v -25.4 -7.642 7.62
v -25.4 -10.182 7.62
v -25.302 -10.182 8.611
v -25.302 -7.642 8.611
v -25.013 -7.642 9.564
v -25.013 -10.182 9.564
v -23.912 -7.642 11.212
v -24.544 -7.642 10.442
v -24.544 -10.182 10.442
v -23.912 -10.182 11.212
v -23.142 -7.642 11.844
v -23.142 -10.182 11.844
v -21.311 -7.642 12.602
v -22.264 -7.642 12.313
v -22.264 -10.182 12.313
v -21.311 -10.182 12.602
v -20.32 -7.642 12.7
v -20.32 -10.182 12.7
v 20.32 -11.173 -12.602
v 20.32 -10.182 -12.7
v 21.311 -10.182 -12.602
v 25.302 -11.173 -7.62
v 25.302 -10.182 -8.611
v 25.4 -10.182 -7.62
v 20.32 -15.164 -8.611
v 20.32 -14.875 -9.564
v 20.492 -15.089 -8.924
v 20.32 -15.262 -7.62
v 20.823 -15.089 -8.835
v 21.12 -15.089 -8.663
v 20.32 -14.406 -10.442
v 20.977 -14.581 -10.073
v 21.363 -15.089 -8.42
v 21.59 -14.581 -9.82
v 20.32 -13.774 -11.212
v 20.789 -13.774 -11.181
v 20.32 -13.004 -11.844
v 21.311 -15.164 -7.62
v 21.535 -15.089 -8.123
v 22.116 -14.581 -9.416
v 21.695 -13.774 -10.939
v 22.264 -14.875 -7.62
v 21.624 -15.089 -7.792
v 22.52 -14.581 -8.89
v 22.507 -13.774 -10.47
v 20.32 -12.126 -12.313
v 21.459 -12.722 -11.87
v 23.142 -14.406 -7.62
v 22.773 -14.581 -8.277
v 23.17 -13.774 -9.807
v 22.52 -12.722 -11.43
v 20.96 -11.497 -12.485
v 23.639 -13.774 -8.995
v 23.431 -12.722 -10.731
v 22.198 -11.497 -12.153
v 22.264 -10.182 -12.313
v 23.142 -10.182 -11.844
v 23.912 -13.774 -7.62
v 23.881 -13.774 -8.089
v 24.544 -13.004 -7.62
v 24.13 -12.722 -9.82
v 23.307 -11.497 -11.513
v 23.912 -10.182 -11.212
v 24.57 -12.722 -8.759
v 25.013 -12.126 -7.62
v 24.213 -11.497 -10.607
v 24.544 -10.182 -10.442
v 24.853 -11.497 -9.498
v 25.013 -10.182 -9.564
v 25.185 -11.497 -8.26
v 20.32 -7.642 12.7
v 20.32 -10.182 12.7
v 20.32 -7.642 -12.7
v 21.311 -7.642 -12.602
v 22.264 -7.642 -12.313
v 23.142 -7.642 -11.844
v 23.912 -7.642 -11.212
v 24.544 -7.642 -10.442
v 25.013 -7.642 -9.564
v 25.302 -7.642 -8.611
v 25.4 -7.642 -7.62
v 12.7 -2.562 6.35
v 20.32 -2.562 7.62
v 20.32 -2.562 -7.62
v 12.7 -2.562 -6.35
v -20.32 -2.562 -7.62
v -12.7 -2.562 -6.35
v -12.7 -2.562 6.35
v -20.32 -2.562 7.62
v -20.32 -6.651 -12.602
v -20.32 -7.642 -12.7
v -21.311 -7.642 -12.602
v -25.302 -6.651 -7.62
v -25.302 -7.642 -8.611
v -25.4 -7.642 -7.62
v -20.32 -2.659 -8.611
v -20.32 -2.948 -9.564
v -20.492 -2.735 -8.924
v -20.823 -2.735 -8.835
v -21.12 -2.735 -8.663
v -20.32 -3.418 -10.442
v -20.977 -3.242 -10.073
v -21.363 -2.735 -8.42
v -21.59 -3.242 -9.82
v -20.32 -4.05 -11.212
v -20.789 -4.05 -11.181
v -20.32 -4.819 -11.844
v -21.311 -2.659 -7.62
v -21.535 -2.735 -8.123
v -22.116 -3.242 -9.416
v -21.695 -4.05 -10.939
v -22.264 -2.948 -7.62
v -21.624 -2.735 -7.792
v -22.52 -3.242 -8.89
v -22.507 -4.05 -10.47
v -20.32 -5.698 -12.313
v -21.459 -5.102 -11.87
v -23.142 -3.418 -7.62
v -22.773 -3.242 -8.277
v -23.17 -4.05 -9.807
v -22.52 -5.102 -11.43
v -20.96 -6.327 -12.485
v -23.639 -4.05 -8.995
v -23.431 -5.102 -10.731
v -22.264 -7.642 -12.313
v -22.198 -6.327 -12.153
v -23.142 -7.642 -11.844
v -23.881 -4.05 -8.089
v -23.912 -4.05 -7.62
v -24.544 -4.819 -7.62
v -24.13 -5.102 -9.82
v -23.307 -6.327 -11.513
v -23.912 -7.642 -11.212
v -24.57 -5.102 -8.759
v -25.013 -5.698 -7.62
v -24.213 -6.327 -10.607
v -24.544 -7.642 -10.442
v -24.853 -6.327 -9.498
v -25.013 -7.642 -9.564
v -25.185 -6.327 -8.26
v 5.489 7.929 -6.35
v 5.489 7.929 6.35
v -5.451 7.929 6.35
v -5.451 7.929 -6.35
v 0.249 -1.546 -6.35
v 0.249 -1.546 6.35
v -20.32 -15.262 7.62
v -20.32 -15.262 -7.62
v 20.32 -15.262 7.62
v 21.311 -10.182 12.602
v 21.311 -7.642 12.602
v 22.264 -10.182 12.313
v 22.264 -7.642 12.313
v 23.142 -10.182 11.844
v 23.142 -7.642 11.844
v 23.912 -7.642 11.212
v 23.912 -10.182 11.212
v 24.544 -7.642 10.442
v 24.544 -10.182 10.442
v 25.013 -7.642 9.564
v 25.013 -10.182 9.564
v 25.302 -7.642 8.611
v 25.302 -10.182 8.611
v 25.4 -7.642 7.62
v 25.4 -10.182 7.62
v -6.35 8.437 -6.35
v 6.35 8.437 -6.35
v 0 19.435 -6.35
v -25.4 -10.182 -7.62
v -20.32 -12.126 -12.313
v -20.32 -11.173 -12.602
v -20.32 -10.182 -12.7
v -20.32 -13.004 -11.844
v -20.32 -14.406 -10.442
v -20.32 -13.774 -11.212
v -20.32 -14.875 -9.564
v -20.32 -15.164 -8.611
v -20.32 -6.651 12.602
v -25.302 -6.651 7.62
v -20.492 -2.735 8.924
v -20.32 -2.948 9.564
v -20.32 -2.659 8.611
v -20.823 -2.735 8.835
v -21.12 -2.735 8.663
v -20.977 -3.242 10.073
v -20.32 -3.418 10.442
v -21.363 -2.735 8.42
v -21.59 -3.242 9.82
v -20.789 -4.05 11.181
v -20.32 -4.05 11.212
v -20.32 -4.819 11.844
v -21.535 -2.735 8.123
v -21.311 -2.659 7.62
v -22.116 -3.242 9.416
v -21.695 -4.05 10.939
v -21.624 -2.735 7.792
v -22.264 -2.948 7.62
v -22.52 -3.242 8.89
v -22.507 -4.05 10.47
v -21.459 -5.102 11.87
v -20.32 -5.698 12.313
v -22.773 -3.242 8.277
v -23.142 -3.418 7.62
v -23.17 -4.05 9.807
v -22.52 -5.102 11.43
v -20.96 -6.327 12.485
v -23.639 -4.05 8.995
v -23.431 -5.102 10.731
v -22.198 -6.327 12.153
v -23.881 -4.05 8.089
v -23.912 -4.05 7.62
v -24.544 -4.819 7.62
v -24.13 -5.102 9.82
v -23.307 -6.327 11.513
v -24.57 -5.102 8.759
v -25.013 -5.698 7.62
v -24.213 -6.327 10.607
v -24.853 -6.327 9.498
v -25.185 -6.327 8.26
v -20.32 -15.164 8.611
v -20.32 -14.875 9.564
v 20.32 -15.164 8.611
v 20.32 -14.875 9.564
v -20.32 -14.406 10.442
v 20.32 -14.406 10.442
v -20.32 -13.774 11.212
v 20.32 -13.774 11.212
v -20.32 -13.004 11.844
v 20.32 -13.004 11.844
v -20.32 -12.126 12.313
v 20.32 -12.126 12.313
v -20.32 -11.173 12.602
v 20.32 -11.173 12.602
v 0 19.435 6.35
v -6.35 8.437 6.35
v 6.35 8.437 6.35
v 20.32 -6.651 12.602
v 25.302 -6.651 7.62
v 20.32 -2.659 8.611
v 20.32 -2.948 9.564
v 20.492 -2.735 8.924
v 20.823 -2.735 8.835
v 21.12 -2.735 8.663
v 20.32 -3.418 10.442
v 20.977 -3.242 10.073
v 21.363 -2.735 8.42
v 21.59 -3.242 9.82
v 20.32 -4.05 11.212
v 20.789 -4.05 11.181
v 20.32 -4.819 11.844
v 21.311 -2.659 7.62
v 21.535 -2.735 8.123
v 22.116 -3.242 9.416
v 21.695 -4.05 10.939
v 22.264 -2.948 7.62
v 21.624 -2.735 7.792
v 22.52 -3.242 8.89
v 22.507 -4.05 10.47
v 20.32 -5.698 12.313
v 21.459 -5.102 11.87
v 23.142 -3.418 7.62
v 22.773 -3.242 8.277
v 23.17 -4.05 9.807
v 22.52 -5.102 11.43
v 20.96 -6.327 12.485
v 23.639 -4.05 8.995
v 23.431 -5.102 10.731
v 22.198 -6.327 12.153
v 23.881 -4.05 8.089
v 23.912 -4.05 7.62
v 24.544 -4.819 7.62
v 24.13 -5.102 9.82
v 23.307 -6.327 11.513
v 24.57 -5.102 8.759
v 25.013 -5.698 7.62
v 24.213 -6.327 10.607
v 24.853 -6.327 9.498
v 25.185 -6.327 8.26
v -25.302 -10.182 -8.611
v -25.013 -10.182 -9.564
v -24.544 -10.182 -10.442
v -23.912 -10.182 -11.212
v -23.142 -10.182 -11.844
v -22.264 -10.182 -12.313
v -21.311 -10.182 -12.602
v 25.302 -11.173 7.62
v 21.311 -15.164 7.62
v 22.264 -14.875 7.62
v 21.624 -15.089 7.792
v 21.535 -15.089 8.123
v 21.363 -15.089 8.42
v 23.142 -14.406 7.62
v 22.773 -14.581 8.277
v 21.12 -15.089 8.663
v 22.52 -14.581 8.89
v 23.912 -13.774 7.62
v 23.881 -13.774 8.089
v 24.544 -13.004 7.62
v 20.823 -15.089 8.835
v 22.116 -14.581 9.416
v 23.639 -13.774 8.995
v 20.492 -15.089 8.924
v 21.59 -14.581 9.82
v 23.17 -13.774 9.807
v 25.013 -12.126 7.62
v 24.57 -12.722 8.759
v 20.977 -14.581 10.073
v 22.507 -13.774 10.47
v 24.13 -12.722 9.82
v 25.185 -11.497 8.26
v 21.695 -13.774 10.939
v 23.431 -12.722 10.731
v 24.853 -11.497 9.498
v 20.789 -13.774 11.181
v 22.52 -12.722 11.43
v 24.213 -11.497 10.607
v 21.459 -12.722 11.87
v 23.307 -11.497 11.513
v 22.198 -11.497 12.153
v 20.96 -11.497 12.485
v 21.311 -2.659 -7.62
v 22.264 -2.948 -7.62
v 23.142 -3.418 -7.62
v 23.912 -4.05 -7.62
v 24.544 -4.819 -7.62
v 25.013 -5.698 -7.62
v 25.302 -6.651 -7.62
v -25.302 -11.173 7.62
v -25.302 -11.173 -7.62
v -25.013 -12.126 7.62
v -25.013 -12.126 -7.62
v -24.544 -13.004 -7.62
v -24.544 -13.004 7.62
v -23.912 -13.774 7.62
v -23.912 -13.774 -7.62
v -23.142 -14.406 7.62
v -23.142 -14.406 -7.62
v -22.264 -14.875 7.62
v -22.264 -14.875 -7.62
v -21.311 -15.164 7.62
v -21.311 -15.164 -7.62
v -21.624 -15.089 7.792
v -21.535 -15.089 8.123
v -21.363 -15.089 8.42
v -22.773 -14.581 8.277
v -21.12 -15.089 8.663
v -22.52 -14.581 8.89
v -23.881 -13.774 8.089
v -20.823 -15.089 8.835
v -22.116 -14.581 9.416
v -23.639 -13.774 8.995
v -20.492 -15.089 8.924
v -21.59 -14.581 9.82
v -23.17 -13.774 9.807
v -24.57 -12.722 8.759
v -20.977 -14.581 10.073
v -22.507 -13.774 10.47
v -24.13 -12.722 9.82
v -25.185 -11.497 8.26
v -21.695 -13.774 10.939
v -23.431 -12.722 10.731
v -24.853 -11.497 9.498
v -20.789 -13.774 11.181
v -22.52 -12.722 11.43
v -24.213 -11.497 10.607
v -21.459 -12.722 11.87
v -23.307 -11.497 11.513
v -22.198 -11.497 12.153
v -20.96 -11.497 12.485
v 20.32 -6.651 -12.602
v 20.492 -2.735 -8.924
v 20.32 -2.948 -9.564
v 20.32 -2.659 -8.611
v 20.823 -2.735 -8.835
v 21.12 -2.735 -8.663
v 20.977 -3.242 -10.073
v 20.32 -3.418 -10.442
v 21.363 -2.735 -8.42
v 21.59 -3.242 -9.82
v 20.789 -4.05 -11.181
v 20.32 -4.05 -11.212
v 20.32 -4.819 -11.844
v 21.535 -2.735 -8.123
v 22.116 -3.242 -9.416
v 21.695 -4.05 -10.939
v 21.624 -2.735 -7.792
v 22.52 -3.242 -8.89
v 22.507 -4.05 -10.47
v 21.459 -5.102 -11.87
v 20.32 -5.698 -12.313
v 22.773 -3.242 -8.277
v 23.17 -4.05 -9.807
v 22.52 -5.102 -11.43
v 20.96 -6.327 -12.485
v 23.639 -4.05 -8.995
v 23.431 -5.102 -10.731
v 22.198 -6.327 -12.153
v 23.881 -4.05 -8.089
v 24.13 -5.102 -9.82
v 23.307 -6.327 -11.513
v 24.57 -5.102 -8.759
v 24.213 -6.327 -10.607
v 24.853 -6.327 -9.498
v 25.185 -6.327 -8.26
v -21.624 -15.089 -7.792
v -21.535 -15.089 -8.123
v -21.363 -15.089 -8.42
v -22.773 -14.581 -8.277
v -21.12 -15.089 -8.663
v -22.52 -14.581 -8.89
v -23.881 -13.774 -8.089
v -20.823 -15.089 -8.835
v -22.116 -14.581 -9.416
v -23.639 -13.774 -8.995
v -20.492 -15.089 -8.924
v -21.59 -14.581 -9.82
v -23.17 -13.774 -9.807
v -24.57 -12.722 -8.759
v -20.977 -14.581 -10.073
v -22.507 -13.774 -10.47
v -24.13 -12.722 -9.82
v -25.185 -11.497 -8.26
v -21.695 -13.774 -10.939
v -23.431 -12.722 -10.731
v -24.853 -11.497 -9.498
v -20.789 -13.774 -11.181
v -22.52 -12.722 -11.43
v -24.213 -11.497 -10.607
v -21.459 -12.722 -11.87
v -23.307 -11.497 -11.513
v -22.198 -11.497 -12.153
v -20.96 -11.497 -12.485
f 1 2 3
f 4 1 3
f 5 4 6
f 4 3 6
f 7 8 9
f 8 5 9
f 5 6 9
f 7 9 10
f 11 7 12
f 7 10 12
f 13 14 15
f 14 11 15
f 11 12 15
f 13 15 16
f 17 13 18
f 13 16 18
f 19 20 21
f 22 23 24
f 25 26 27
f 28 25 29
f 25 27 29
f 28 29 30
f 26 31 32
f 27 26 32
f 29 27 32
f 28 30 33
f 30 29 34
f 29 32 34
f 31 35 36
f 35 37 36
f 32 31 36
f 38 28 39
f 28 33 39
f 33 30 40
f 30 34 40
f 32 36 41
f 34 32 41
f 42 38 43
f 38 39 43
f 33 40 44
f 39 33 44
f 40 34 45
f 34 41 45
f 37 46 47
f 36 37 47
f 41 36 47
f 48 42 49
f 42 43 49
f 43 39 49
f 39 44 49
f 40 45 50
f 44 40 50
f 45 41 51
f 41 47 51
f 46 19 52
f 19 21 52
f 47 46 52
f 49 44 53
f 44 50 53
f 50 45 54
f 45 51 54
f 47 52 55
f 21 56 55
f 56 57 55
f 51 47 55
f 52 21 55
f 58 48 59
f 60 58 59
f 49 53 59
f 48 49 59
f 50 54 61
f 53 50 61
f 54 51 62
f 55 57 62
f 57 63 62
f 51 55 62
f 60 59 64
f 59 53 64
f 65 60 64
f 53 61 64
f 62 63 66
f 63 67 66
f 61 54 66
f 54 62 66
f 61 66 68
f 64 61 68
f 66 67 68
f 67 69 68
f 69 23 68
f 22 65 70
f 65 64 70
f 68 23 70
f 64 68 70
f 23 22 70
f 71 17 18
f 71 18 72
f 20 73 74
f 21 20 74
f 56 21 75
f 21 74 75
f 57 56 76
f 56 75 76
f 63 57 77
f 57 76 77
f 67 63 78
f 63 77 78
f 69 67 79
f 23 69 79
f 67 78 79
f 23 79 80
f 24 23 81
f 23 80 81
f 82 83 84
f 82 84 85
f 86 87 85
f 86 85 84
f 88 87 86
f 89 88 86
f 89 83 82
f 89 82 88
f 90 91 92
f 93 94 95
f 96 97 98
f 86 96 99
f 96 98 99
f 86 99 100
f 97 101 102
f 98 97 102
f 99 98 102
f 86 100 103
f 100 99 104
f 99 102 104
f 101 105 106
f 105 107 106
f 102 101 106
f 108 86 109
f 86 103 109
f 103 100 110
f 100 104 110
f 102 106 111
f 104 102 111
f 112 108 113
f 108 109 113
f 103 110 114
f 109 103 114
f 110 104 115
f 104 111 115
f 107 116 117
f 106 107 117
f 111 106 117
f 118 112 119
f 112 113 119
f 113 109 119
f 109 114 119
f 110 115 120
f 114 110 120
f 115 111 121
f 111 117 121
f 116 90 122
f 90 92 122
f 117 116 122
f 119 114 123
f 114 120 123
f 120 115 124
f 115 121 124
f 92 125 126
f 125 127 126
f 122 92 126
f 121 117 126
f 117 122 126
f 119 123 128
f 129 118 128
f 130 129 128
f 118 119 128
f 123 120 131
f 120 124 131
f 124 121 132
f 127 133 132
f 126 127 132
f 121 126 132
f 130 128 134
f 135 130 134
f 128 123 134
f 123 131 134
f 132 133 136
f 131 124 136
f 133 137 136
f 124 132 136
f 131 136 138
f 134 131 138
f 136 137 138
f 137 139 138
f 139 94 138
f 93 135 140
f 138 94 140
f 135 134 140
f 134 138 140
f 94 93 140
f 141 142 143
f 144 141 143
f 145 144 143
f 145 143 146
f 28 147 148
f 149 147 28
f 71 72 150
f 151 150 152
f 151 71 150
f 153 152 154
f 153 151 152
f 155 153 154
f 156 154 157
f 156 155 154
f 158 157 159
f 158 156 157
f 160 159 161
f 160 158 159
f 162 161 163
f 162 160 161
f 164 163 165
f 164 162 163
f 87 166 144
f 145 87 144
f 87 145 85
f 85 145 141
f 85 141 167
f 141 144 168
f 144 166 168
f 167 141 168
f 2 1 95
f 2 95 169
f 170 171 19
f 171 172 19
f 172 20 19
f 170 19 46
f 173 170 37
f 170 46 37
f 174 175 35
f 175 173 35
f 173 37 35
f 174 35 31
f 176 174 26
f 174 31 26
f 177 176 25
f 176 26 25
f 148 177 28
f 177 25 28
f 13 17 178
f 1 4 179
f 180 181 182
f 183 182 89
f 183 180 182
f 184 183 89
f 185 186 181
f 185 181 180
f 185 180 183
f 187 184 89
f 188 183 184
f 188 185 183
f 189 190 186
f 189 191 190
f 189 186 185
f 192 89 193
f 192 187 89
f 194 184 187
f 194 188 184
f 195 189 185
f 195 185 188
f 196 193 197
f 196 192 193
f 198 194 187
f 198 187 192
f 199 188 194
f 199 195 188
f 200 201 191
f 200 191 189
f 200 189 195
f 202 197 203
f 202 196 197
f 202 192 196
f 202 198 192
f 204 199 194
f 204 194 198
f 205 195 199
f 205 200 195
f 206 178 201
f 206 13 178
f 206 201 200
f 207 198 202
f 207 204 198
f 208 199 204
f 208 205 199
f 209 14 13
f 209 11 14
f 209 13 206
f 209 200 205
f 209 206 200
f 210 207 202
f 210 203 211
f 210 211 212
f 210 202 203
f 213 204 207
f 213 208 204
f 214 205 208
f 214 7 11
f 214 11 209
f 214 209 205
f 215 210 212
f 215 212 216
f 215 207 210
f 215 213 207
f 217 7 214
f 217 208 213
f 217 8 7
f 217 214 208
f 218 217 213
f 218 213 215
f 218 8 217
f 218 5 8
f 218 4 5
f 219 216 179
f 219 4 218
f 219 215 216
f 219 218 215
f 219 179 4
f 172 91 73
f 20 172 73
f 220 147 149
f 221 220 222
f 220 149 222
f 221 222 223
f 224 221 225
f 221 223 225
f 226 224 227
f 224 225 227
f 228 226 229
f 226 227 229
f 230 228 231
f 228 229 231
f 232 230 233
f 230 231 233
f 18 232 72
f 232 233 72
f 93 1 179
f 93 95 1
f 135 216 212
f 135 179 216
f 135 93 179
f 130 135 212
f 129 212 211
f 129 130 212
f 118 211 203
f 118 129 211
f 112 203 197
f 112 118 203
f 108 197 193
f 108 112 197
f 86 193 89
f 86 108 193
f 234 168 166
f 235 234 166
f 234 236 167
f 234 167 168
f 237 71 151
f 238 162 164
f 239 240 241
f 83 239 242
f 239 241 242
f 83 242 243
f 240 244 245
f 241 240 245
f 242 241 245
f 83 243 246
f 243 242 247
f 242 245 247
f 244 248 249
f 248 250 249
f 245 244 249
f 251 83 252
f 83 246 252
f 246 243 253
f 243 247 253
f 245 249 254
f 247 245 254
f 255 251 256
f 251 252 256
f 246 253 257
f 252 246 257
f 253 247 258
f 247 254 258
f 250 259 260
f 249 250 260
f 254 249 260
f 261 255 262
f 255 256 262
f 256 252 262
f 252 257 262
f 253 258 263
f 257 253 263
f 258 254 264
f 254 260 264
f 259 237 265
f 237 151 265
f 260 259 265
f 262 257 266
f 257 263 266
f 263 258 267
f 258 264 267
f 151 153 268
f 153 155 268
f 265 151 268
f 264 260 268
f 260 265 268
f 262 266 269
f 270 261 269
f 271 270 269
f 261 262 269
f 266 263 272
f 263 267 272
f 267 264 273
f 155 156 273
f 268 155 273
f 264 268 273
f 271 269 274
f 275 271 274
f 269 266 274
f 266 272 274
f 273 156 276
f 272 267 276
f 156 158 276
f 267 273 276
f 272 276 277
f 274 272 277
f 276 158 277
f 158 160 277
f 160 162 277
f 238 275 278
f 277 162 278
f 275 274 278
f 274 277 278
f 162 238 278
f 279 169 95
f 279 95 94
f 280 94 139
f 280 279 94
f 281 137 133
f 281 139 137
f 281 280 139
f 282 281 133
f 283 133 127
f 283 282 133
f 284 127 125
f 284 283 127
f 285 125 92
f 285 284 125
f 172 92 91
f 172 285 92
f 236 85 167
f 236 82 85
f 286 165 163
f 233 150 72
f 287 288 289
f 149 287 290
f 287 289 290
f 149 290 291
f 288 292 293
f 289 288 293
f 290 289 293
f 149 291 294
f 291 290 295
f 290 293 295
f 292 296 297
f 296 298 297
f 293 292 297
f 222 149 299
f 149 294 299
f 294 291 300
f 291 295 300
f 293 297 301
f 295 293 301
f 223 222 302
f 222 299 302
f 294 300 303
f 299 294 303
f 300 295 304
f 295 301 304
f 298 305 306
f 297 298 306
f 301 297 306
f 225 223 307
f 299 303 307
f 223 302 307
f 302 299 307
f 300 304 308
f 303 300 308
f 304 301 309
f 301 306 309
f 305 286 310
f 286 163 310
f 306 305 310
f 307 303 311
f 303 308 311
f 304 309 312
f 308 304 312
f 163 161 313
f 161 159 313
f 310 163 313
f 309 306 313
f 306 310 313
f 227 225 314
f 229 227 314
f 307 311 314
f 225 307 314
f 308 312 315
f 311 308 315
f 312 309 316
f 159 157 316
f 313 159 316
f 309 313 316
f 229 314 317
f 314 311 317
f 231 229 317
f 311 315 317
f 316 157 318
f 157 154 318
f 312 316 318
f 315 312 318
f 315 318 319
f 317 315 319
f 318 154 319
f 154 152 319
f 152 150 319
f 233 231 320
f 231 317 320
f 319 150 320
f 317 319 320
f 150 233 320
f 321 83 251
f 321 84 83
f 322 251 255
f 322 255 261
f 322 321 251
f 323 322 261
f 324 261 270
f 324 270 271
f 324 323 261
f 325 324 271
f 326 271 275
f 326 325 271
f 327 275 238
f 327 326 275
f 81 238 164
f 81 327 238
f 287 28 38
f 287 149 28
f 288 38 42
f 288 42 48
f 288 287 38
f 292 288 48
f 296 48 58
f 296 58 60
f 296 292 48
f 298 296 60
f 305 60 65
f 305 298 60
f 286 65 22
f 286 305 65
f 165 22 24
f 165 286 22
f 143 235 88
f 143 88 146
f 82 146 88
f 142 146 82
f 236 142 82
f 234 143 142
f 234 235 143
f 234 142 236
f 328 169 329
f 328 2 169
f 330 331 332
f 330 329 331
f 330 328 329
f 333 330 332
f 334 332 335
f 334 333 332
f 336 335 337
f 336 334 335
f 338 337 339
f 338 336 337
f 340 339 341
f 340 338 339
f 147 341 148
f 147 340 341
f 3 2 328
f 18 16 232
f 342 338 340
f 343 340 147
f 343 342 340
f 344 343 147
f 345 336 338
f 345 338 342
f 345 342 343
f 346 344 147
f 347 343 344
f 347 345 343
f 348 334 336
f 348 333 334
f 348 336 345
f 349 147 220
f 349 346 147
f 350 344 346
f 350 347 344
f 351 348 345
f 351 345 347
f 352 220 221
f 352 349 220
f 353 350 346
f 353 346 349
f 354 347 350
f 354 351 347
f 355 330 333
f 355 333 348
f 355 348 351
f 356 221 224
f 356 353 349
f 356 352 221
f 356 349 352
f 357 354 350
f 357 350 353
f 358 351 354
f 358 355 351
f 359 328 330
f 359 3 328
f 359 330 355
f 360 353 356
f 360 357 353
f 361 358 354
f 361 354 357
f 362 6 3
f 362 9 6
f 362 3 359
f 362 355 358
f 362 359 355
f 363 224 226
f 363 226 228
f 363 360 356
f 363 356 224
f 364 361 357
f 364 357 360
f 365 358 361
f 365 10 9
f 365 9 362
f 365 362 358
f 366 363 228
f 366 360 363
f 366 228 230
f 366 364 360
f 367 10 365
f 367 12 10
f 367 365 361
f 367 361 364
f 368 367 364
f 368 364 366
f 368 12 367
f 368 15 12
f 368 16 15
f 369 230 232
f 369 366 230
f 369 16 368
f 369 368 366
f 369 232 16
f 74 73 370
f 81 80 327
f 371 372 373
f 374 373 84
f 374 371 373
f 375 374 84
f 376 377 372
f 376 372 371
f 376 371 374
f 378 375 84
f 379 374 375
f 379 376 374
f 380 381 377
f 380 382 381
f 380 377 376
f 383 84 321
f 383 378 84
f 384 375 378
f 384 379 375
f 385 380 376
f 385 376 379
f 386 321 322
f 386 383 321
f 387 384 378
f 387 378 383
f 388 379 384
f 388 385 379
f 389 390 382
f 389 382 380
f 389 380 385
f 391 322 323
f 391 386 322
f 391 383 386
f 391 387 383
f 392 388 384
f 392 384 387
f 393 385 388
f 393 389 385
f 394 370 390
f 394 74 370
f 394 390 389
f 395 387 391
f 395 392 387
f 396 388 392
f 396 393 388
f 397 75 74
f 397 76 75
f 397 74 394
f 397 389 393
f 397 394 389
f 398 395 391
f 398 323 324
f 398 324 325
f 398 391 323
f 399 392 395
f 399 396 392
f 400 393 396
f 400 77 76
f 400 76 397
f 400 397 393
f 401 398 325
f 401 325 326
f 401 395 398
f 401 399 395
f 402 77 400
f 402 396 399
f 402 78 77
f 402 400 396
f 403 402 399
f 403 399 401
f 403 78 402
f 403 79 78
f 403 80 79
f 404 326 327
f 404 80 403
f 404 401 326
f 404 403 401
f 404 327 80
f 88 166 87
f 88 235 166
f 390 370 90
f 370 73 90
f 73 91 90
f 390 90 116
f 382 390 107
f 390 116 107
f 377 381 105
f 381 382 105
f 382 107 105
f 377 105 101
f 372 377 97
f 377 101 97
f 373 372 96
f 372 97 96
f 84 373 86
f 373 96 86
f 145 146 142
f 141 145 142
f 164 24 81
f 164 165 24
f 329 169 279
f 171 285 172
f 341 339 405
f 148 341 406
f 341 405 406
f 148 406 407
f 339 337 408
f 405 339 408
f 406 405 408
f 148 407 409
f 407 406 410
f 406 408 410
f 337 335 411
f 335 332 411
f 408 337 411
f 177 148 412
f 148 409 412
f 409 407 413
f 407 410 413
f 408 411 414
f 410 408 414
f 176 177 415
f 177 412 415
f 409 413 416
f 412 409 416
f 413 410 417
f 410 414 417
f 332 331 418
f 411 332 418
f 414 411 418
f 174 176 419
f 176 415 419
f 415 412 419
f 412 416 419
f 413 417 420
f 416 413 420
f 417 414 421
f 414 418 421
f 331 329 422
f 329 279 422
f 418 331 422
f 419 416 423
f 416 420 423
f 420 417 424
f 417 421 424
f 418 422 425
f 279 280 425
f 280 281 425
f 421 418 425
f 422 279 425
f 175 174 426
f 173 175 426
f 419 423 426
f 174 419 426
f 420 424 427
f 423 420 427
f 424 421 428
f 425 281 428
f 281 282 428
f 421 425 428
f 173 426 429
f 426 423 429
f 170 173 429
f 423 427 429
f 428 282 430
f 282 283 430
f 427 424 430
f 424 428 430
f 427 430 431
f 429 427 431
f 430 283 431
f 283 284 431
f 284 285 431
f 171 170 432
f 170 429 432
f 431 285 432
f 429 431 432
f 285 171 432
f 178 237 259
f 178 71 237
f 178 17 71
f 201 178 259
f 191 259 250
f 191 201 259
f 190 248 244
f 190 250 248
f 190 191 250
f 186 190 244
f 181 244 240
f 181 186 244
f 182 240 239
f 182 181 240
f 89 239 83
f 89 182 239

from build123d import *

# Parameters (mm, degrees)
F1_DEPTH = 12.7
F2_DEPTH = 6.35
F4_DEPTH = 19.051
F5_R     = 5.08


# Not quite as in the source:
# - a feature names something its author has since deleted; it is built from what else it names


with BuildPart() as f1:
    # F0 (on Top) → F1 (new body, symmetric)
    with BuildSketch(Plane.XY):
        Polygon((0.2673684239, -2.5617282353), (-12.7, -2.5617282353), (-25.4, -2.5617282353), (-25.4, -15.2617282353), (25.4, -15.2617282353), (25.4, -2.5617282353), (12.7, -2.5617282353), align=None)
    extrude(amount=F1_DEPTH, both=True)

    # F0 (on Top) → F2 (join, symmetric)
    with BuildSketch(Plane.XY):
        Polygon((6.35, 8.4367943928), (0.2673684239, -2.5617282353), (12.7, -2.5617282353), align=None)
        Polygon((-6.35, 8.4367943928), (-12.7, -2.5617282353), (0.2673684239, -2.5617282353), align=None)
        Polygon((0, 19.4353170208), (-6.35, 8.4367943928), (6.35, 8.4367943928), align=None)
        Polygon((-6.35, 8.4367943928), (0.2673684239, -2.5617282353), (6.35, 8.4367943928), align=None)
    extrude(amount=F2_DEPTH, both=True)

    # F3 (on face) → F4 (cut, through all)
    with BuildSketch(Plane.XY.offset(6.35)):
        Polygon((5.4885434949, 7.9287943928), (-5.4514978916, 7.9287943928), (0.2488394649, -1.5455593664), align=None)
    extrude(amount=-F4_DEPTH, mode=Mode.SUBTRACT)

    # F5
    f5_edges = [f1.edges().sort_by_distance(p)[0] for p in [
        (-25.4, -8.911728, 12.7),
        (-25.4, -8.911728, -12.7),
        (25.4, -8.911728, -12.7),
        (25.4, -8.911728, 12.7),
        (-25.4, -15.261728, 0),
        (0, -15.261728, -12.7),
        (25.4, -15.261728, 0),
        (0, -15.261728, 12.7),
        (0, -2.561728, 12.7),
        (0, -2.561728, -12.7),
        (25.4, -2.561728, 0),
        (-25.4, -2.561728, 0),
    ]]
    fillet(f5_edges, radius=F5_R)


solid = f1.part
